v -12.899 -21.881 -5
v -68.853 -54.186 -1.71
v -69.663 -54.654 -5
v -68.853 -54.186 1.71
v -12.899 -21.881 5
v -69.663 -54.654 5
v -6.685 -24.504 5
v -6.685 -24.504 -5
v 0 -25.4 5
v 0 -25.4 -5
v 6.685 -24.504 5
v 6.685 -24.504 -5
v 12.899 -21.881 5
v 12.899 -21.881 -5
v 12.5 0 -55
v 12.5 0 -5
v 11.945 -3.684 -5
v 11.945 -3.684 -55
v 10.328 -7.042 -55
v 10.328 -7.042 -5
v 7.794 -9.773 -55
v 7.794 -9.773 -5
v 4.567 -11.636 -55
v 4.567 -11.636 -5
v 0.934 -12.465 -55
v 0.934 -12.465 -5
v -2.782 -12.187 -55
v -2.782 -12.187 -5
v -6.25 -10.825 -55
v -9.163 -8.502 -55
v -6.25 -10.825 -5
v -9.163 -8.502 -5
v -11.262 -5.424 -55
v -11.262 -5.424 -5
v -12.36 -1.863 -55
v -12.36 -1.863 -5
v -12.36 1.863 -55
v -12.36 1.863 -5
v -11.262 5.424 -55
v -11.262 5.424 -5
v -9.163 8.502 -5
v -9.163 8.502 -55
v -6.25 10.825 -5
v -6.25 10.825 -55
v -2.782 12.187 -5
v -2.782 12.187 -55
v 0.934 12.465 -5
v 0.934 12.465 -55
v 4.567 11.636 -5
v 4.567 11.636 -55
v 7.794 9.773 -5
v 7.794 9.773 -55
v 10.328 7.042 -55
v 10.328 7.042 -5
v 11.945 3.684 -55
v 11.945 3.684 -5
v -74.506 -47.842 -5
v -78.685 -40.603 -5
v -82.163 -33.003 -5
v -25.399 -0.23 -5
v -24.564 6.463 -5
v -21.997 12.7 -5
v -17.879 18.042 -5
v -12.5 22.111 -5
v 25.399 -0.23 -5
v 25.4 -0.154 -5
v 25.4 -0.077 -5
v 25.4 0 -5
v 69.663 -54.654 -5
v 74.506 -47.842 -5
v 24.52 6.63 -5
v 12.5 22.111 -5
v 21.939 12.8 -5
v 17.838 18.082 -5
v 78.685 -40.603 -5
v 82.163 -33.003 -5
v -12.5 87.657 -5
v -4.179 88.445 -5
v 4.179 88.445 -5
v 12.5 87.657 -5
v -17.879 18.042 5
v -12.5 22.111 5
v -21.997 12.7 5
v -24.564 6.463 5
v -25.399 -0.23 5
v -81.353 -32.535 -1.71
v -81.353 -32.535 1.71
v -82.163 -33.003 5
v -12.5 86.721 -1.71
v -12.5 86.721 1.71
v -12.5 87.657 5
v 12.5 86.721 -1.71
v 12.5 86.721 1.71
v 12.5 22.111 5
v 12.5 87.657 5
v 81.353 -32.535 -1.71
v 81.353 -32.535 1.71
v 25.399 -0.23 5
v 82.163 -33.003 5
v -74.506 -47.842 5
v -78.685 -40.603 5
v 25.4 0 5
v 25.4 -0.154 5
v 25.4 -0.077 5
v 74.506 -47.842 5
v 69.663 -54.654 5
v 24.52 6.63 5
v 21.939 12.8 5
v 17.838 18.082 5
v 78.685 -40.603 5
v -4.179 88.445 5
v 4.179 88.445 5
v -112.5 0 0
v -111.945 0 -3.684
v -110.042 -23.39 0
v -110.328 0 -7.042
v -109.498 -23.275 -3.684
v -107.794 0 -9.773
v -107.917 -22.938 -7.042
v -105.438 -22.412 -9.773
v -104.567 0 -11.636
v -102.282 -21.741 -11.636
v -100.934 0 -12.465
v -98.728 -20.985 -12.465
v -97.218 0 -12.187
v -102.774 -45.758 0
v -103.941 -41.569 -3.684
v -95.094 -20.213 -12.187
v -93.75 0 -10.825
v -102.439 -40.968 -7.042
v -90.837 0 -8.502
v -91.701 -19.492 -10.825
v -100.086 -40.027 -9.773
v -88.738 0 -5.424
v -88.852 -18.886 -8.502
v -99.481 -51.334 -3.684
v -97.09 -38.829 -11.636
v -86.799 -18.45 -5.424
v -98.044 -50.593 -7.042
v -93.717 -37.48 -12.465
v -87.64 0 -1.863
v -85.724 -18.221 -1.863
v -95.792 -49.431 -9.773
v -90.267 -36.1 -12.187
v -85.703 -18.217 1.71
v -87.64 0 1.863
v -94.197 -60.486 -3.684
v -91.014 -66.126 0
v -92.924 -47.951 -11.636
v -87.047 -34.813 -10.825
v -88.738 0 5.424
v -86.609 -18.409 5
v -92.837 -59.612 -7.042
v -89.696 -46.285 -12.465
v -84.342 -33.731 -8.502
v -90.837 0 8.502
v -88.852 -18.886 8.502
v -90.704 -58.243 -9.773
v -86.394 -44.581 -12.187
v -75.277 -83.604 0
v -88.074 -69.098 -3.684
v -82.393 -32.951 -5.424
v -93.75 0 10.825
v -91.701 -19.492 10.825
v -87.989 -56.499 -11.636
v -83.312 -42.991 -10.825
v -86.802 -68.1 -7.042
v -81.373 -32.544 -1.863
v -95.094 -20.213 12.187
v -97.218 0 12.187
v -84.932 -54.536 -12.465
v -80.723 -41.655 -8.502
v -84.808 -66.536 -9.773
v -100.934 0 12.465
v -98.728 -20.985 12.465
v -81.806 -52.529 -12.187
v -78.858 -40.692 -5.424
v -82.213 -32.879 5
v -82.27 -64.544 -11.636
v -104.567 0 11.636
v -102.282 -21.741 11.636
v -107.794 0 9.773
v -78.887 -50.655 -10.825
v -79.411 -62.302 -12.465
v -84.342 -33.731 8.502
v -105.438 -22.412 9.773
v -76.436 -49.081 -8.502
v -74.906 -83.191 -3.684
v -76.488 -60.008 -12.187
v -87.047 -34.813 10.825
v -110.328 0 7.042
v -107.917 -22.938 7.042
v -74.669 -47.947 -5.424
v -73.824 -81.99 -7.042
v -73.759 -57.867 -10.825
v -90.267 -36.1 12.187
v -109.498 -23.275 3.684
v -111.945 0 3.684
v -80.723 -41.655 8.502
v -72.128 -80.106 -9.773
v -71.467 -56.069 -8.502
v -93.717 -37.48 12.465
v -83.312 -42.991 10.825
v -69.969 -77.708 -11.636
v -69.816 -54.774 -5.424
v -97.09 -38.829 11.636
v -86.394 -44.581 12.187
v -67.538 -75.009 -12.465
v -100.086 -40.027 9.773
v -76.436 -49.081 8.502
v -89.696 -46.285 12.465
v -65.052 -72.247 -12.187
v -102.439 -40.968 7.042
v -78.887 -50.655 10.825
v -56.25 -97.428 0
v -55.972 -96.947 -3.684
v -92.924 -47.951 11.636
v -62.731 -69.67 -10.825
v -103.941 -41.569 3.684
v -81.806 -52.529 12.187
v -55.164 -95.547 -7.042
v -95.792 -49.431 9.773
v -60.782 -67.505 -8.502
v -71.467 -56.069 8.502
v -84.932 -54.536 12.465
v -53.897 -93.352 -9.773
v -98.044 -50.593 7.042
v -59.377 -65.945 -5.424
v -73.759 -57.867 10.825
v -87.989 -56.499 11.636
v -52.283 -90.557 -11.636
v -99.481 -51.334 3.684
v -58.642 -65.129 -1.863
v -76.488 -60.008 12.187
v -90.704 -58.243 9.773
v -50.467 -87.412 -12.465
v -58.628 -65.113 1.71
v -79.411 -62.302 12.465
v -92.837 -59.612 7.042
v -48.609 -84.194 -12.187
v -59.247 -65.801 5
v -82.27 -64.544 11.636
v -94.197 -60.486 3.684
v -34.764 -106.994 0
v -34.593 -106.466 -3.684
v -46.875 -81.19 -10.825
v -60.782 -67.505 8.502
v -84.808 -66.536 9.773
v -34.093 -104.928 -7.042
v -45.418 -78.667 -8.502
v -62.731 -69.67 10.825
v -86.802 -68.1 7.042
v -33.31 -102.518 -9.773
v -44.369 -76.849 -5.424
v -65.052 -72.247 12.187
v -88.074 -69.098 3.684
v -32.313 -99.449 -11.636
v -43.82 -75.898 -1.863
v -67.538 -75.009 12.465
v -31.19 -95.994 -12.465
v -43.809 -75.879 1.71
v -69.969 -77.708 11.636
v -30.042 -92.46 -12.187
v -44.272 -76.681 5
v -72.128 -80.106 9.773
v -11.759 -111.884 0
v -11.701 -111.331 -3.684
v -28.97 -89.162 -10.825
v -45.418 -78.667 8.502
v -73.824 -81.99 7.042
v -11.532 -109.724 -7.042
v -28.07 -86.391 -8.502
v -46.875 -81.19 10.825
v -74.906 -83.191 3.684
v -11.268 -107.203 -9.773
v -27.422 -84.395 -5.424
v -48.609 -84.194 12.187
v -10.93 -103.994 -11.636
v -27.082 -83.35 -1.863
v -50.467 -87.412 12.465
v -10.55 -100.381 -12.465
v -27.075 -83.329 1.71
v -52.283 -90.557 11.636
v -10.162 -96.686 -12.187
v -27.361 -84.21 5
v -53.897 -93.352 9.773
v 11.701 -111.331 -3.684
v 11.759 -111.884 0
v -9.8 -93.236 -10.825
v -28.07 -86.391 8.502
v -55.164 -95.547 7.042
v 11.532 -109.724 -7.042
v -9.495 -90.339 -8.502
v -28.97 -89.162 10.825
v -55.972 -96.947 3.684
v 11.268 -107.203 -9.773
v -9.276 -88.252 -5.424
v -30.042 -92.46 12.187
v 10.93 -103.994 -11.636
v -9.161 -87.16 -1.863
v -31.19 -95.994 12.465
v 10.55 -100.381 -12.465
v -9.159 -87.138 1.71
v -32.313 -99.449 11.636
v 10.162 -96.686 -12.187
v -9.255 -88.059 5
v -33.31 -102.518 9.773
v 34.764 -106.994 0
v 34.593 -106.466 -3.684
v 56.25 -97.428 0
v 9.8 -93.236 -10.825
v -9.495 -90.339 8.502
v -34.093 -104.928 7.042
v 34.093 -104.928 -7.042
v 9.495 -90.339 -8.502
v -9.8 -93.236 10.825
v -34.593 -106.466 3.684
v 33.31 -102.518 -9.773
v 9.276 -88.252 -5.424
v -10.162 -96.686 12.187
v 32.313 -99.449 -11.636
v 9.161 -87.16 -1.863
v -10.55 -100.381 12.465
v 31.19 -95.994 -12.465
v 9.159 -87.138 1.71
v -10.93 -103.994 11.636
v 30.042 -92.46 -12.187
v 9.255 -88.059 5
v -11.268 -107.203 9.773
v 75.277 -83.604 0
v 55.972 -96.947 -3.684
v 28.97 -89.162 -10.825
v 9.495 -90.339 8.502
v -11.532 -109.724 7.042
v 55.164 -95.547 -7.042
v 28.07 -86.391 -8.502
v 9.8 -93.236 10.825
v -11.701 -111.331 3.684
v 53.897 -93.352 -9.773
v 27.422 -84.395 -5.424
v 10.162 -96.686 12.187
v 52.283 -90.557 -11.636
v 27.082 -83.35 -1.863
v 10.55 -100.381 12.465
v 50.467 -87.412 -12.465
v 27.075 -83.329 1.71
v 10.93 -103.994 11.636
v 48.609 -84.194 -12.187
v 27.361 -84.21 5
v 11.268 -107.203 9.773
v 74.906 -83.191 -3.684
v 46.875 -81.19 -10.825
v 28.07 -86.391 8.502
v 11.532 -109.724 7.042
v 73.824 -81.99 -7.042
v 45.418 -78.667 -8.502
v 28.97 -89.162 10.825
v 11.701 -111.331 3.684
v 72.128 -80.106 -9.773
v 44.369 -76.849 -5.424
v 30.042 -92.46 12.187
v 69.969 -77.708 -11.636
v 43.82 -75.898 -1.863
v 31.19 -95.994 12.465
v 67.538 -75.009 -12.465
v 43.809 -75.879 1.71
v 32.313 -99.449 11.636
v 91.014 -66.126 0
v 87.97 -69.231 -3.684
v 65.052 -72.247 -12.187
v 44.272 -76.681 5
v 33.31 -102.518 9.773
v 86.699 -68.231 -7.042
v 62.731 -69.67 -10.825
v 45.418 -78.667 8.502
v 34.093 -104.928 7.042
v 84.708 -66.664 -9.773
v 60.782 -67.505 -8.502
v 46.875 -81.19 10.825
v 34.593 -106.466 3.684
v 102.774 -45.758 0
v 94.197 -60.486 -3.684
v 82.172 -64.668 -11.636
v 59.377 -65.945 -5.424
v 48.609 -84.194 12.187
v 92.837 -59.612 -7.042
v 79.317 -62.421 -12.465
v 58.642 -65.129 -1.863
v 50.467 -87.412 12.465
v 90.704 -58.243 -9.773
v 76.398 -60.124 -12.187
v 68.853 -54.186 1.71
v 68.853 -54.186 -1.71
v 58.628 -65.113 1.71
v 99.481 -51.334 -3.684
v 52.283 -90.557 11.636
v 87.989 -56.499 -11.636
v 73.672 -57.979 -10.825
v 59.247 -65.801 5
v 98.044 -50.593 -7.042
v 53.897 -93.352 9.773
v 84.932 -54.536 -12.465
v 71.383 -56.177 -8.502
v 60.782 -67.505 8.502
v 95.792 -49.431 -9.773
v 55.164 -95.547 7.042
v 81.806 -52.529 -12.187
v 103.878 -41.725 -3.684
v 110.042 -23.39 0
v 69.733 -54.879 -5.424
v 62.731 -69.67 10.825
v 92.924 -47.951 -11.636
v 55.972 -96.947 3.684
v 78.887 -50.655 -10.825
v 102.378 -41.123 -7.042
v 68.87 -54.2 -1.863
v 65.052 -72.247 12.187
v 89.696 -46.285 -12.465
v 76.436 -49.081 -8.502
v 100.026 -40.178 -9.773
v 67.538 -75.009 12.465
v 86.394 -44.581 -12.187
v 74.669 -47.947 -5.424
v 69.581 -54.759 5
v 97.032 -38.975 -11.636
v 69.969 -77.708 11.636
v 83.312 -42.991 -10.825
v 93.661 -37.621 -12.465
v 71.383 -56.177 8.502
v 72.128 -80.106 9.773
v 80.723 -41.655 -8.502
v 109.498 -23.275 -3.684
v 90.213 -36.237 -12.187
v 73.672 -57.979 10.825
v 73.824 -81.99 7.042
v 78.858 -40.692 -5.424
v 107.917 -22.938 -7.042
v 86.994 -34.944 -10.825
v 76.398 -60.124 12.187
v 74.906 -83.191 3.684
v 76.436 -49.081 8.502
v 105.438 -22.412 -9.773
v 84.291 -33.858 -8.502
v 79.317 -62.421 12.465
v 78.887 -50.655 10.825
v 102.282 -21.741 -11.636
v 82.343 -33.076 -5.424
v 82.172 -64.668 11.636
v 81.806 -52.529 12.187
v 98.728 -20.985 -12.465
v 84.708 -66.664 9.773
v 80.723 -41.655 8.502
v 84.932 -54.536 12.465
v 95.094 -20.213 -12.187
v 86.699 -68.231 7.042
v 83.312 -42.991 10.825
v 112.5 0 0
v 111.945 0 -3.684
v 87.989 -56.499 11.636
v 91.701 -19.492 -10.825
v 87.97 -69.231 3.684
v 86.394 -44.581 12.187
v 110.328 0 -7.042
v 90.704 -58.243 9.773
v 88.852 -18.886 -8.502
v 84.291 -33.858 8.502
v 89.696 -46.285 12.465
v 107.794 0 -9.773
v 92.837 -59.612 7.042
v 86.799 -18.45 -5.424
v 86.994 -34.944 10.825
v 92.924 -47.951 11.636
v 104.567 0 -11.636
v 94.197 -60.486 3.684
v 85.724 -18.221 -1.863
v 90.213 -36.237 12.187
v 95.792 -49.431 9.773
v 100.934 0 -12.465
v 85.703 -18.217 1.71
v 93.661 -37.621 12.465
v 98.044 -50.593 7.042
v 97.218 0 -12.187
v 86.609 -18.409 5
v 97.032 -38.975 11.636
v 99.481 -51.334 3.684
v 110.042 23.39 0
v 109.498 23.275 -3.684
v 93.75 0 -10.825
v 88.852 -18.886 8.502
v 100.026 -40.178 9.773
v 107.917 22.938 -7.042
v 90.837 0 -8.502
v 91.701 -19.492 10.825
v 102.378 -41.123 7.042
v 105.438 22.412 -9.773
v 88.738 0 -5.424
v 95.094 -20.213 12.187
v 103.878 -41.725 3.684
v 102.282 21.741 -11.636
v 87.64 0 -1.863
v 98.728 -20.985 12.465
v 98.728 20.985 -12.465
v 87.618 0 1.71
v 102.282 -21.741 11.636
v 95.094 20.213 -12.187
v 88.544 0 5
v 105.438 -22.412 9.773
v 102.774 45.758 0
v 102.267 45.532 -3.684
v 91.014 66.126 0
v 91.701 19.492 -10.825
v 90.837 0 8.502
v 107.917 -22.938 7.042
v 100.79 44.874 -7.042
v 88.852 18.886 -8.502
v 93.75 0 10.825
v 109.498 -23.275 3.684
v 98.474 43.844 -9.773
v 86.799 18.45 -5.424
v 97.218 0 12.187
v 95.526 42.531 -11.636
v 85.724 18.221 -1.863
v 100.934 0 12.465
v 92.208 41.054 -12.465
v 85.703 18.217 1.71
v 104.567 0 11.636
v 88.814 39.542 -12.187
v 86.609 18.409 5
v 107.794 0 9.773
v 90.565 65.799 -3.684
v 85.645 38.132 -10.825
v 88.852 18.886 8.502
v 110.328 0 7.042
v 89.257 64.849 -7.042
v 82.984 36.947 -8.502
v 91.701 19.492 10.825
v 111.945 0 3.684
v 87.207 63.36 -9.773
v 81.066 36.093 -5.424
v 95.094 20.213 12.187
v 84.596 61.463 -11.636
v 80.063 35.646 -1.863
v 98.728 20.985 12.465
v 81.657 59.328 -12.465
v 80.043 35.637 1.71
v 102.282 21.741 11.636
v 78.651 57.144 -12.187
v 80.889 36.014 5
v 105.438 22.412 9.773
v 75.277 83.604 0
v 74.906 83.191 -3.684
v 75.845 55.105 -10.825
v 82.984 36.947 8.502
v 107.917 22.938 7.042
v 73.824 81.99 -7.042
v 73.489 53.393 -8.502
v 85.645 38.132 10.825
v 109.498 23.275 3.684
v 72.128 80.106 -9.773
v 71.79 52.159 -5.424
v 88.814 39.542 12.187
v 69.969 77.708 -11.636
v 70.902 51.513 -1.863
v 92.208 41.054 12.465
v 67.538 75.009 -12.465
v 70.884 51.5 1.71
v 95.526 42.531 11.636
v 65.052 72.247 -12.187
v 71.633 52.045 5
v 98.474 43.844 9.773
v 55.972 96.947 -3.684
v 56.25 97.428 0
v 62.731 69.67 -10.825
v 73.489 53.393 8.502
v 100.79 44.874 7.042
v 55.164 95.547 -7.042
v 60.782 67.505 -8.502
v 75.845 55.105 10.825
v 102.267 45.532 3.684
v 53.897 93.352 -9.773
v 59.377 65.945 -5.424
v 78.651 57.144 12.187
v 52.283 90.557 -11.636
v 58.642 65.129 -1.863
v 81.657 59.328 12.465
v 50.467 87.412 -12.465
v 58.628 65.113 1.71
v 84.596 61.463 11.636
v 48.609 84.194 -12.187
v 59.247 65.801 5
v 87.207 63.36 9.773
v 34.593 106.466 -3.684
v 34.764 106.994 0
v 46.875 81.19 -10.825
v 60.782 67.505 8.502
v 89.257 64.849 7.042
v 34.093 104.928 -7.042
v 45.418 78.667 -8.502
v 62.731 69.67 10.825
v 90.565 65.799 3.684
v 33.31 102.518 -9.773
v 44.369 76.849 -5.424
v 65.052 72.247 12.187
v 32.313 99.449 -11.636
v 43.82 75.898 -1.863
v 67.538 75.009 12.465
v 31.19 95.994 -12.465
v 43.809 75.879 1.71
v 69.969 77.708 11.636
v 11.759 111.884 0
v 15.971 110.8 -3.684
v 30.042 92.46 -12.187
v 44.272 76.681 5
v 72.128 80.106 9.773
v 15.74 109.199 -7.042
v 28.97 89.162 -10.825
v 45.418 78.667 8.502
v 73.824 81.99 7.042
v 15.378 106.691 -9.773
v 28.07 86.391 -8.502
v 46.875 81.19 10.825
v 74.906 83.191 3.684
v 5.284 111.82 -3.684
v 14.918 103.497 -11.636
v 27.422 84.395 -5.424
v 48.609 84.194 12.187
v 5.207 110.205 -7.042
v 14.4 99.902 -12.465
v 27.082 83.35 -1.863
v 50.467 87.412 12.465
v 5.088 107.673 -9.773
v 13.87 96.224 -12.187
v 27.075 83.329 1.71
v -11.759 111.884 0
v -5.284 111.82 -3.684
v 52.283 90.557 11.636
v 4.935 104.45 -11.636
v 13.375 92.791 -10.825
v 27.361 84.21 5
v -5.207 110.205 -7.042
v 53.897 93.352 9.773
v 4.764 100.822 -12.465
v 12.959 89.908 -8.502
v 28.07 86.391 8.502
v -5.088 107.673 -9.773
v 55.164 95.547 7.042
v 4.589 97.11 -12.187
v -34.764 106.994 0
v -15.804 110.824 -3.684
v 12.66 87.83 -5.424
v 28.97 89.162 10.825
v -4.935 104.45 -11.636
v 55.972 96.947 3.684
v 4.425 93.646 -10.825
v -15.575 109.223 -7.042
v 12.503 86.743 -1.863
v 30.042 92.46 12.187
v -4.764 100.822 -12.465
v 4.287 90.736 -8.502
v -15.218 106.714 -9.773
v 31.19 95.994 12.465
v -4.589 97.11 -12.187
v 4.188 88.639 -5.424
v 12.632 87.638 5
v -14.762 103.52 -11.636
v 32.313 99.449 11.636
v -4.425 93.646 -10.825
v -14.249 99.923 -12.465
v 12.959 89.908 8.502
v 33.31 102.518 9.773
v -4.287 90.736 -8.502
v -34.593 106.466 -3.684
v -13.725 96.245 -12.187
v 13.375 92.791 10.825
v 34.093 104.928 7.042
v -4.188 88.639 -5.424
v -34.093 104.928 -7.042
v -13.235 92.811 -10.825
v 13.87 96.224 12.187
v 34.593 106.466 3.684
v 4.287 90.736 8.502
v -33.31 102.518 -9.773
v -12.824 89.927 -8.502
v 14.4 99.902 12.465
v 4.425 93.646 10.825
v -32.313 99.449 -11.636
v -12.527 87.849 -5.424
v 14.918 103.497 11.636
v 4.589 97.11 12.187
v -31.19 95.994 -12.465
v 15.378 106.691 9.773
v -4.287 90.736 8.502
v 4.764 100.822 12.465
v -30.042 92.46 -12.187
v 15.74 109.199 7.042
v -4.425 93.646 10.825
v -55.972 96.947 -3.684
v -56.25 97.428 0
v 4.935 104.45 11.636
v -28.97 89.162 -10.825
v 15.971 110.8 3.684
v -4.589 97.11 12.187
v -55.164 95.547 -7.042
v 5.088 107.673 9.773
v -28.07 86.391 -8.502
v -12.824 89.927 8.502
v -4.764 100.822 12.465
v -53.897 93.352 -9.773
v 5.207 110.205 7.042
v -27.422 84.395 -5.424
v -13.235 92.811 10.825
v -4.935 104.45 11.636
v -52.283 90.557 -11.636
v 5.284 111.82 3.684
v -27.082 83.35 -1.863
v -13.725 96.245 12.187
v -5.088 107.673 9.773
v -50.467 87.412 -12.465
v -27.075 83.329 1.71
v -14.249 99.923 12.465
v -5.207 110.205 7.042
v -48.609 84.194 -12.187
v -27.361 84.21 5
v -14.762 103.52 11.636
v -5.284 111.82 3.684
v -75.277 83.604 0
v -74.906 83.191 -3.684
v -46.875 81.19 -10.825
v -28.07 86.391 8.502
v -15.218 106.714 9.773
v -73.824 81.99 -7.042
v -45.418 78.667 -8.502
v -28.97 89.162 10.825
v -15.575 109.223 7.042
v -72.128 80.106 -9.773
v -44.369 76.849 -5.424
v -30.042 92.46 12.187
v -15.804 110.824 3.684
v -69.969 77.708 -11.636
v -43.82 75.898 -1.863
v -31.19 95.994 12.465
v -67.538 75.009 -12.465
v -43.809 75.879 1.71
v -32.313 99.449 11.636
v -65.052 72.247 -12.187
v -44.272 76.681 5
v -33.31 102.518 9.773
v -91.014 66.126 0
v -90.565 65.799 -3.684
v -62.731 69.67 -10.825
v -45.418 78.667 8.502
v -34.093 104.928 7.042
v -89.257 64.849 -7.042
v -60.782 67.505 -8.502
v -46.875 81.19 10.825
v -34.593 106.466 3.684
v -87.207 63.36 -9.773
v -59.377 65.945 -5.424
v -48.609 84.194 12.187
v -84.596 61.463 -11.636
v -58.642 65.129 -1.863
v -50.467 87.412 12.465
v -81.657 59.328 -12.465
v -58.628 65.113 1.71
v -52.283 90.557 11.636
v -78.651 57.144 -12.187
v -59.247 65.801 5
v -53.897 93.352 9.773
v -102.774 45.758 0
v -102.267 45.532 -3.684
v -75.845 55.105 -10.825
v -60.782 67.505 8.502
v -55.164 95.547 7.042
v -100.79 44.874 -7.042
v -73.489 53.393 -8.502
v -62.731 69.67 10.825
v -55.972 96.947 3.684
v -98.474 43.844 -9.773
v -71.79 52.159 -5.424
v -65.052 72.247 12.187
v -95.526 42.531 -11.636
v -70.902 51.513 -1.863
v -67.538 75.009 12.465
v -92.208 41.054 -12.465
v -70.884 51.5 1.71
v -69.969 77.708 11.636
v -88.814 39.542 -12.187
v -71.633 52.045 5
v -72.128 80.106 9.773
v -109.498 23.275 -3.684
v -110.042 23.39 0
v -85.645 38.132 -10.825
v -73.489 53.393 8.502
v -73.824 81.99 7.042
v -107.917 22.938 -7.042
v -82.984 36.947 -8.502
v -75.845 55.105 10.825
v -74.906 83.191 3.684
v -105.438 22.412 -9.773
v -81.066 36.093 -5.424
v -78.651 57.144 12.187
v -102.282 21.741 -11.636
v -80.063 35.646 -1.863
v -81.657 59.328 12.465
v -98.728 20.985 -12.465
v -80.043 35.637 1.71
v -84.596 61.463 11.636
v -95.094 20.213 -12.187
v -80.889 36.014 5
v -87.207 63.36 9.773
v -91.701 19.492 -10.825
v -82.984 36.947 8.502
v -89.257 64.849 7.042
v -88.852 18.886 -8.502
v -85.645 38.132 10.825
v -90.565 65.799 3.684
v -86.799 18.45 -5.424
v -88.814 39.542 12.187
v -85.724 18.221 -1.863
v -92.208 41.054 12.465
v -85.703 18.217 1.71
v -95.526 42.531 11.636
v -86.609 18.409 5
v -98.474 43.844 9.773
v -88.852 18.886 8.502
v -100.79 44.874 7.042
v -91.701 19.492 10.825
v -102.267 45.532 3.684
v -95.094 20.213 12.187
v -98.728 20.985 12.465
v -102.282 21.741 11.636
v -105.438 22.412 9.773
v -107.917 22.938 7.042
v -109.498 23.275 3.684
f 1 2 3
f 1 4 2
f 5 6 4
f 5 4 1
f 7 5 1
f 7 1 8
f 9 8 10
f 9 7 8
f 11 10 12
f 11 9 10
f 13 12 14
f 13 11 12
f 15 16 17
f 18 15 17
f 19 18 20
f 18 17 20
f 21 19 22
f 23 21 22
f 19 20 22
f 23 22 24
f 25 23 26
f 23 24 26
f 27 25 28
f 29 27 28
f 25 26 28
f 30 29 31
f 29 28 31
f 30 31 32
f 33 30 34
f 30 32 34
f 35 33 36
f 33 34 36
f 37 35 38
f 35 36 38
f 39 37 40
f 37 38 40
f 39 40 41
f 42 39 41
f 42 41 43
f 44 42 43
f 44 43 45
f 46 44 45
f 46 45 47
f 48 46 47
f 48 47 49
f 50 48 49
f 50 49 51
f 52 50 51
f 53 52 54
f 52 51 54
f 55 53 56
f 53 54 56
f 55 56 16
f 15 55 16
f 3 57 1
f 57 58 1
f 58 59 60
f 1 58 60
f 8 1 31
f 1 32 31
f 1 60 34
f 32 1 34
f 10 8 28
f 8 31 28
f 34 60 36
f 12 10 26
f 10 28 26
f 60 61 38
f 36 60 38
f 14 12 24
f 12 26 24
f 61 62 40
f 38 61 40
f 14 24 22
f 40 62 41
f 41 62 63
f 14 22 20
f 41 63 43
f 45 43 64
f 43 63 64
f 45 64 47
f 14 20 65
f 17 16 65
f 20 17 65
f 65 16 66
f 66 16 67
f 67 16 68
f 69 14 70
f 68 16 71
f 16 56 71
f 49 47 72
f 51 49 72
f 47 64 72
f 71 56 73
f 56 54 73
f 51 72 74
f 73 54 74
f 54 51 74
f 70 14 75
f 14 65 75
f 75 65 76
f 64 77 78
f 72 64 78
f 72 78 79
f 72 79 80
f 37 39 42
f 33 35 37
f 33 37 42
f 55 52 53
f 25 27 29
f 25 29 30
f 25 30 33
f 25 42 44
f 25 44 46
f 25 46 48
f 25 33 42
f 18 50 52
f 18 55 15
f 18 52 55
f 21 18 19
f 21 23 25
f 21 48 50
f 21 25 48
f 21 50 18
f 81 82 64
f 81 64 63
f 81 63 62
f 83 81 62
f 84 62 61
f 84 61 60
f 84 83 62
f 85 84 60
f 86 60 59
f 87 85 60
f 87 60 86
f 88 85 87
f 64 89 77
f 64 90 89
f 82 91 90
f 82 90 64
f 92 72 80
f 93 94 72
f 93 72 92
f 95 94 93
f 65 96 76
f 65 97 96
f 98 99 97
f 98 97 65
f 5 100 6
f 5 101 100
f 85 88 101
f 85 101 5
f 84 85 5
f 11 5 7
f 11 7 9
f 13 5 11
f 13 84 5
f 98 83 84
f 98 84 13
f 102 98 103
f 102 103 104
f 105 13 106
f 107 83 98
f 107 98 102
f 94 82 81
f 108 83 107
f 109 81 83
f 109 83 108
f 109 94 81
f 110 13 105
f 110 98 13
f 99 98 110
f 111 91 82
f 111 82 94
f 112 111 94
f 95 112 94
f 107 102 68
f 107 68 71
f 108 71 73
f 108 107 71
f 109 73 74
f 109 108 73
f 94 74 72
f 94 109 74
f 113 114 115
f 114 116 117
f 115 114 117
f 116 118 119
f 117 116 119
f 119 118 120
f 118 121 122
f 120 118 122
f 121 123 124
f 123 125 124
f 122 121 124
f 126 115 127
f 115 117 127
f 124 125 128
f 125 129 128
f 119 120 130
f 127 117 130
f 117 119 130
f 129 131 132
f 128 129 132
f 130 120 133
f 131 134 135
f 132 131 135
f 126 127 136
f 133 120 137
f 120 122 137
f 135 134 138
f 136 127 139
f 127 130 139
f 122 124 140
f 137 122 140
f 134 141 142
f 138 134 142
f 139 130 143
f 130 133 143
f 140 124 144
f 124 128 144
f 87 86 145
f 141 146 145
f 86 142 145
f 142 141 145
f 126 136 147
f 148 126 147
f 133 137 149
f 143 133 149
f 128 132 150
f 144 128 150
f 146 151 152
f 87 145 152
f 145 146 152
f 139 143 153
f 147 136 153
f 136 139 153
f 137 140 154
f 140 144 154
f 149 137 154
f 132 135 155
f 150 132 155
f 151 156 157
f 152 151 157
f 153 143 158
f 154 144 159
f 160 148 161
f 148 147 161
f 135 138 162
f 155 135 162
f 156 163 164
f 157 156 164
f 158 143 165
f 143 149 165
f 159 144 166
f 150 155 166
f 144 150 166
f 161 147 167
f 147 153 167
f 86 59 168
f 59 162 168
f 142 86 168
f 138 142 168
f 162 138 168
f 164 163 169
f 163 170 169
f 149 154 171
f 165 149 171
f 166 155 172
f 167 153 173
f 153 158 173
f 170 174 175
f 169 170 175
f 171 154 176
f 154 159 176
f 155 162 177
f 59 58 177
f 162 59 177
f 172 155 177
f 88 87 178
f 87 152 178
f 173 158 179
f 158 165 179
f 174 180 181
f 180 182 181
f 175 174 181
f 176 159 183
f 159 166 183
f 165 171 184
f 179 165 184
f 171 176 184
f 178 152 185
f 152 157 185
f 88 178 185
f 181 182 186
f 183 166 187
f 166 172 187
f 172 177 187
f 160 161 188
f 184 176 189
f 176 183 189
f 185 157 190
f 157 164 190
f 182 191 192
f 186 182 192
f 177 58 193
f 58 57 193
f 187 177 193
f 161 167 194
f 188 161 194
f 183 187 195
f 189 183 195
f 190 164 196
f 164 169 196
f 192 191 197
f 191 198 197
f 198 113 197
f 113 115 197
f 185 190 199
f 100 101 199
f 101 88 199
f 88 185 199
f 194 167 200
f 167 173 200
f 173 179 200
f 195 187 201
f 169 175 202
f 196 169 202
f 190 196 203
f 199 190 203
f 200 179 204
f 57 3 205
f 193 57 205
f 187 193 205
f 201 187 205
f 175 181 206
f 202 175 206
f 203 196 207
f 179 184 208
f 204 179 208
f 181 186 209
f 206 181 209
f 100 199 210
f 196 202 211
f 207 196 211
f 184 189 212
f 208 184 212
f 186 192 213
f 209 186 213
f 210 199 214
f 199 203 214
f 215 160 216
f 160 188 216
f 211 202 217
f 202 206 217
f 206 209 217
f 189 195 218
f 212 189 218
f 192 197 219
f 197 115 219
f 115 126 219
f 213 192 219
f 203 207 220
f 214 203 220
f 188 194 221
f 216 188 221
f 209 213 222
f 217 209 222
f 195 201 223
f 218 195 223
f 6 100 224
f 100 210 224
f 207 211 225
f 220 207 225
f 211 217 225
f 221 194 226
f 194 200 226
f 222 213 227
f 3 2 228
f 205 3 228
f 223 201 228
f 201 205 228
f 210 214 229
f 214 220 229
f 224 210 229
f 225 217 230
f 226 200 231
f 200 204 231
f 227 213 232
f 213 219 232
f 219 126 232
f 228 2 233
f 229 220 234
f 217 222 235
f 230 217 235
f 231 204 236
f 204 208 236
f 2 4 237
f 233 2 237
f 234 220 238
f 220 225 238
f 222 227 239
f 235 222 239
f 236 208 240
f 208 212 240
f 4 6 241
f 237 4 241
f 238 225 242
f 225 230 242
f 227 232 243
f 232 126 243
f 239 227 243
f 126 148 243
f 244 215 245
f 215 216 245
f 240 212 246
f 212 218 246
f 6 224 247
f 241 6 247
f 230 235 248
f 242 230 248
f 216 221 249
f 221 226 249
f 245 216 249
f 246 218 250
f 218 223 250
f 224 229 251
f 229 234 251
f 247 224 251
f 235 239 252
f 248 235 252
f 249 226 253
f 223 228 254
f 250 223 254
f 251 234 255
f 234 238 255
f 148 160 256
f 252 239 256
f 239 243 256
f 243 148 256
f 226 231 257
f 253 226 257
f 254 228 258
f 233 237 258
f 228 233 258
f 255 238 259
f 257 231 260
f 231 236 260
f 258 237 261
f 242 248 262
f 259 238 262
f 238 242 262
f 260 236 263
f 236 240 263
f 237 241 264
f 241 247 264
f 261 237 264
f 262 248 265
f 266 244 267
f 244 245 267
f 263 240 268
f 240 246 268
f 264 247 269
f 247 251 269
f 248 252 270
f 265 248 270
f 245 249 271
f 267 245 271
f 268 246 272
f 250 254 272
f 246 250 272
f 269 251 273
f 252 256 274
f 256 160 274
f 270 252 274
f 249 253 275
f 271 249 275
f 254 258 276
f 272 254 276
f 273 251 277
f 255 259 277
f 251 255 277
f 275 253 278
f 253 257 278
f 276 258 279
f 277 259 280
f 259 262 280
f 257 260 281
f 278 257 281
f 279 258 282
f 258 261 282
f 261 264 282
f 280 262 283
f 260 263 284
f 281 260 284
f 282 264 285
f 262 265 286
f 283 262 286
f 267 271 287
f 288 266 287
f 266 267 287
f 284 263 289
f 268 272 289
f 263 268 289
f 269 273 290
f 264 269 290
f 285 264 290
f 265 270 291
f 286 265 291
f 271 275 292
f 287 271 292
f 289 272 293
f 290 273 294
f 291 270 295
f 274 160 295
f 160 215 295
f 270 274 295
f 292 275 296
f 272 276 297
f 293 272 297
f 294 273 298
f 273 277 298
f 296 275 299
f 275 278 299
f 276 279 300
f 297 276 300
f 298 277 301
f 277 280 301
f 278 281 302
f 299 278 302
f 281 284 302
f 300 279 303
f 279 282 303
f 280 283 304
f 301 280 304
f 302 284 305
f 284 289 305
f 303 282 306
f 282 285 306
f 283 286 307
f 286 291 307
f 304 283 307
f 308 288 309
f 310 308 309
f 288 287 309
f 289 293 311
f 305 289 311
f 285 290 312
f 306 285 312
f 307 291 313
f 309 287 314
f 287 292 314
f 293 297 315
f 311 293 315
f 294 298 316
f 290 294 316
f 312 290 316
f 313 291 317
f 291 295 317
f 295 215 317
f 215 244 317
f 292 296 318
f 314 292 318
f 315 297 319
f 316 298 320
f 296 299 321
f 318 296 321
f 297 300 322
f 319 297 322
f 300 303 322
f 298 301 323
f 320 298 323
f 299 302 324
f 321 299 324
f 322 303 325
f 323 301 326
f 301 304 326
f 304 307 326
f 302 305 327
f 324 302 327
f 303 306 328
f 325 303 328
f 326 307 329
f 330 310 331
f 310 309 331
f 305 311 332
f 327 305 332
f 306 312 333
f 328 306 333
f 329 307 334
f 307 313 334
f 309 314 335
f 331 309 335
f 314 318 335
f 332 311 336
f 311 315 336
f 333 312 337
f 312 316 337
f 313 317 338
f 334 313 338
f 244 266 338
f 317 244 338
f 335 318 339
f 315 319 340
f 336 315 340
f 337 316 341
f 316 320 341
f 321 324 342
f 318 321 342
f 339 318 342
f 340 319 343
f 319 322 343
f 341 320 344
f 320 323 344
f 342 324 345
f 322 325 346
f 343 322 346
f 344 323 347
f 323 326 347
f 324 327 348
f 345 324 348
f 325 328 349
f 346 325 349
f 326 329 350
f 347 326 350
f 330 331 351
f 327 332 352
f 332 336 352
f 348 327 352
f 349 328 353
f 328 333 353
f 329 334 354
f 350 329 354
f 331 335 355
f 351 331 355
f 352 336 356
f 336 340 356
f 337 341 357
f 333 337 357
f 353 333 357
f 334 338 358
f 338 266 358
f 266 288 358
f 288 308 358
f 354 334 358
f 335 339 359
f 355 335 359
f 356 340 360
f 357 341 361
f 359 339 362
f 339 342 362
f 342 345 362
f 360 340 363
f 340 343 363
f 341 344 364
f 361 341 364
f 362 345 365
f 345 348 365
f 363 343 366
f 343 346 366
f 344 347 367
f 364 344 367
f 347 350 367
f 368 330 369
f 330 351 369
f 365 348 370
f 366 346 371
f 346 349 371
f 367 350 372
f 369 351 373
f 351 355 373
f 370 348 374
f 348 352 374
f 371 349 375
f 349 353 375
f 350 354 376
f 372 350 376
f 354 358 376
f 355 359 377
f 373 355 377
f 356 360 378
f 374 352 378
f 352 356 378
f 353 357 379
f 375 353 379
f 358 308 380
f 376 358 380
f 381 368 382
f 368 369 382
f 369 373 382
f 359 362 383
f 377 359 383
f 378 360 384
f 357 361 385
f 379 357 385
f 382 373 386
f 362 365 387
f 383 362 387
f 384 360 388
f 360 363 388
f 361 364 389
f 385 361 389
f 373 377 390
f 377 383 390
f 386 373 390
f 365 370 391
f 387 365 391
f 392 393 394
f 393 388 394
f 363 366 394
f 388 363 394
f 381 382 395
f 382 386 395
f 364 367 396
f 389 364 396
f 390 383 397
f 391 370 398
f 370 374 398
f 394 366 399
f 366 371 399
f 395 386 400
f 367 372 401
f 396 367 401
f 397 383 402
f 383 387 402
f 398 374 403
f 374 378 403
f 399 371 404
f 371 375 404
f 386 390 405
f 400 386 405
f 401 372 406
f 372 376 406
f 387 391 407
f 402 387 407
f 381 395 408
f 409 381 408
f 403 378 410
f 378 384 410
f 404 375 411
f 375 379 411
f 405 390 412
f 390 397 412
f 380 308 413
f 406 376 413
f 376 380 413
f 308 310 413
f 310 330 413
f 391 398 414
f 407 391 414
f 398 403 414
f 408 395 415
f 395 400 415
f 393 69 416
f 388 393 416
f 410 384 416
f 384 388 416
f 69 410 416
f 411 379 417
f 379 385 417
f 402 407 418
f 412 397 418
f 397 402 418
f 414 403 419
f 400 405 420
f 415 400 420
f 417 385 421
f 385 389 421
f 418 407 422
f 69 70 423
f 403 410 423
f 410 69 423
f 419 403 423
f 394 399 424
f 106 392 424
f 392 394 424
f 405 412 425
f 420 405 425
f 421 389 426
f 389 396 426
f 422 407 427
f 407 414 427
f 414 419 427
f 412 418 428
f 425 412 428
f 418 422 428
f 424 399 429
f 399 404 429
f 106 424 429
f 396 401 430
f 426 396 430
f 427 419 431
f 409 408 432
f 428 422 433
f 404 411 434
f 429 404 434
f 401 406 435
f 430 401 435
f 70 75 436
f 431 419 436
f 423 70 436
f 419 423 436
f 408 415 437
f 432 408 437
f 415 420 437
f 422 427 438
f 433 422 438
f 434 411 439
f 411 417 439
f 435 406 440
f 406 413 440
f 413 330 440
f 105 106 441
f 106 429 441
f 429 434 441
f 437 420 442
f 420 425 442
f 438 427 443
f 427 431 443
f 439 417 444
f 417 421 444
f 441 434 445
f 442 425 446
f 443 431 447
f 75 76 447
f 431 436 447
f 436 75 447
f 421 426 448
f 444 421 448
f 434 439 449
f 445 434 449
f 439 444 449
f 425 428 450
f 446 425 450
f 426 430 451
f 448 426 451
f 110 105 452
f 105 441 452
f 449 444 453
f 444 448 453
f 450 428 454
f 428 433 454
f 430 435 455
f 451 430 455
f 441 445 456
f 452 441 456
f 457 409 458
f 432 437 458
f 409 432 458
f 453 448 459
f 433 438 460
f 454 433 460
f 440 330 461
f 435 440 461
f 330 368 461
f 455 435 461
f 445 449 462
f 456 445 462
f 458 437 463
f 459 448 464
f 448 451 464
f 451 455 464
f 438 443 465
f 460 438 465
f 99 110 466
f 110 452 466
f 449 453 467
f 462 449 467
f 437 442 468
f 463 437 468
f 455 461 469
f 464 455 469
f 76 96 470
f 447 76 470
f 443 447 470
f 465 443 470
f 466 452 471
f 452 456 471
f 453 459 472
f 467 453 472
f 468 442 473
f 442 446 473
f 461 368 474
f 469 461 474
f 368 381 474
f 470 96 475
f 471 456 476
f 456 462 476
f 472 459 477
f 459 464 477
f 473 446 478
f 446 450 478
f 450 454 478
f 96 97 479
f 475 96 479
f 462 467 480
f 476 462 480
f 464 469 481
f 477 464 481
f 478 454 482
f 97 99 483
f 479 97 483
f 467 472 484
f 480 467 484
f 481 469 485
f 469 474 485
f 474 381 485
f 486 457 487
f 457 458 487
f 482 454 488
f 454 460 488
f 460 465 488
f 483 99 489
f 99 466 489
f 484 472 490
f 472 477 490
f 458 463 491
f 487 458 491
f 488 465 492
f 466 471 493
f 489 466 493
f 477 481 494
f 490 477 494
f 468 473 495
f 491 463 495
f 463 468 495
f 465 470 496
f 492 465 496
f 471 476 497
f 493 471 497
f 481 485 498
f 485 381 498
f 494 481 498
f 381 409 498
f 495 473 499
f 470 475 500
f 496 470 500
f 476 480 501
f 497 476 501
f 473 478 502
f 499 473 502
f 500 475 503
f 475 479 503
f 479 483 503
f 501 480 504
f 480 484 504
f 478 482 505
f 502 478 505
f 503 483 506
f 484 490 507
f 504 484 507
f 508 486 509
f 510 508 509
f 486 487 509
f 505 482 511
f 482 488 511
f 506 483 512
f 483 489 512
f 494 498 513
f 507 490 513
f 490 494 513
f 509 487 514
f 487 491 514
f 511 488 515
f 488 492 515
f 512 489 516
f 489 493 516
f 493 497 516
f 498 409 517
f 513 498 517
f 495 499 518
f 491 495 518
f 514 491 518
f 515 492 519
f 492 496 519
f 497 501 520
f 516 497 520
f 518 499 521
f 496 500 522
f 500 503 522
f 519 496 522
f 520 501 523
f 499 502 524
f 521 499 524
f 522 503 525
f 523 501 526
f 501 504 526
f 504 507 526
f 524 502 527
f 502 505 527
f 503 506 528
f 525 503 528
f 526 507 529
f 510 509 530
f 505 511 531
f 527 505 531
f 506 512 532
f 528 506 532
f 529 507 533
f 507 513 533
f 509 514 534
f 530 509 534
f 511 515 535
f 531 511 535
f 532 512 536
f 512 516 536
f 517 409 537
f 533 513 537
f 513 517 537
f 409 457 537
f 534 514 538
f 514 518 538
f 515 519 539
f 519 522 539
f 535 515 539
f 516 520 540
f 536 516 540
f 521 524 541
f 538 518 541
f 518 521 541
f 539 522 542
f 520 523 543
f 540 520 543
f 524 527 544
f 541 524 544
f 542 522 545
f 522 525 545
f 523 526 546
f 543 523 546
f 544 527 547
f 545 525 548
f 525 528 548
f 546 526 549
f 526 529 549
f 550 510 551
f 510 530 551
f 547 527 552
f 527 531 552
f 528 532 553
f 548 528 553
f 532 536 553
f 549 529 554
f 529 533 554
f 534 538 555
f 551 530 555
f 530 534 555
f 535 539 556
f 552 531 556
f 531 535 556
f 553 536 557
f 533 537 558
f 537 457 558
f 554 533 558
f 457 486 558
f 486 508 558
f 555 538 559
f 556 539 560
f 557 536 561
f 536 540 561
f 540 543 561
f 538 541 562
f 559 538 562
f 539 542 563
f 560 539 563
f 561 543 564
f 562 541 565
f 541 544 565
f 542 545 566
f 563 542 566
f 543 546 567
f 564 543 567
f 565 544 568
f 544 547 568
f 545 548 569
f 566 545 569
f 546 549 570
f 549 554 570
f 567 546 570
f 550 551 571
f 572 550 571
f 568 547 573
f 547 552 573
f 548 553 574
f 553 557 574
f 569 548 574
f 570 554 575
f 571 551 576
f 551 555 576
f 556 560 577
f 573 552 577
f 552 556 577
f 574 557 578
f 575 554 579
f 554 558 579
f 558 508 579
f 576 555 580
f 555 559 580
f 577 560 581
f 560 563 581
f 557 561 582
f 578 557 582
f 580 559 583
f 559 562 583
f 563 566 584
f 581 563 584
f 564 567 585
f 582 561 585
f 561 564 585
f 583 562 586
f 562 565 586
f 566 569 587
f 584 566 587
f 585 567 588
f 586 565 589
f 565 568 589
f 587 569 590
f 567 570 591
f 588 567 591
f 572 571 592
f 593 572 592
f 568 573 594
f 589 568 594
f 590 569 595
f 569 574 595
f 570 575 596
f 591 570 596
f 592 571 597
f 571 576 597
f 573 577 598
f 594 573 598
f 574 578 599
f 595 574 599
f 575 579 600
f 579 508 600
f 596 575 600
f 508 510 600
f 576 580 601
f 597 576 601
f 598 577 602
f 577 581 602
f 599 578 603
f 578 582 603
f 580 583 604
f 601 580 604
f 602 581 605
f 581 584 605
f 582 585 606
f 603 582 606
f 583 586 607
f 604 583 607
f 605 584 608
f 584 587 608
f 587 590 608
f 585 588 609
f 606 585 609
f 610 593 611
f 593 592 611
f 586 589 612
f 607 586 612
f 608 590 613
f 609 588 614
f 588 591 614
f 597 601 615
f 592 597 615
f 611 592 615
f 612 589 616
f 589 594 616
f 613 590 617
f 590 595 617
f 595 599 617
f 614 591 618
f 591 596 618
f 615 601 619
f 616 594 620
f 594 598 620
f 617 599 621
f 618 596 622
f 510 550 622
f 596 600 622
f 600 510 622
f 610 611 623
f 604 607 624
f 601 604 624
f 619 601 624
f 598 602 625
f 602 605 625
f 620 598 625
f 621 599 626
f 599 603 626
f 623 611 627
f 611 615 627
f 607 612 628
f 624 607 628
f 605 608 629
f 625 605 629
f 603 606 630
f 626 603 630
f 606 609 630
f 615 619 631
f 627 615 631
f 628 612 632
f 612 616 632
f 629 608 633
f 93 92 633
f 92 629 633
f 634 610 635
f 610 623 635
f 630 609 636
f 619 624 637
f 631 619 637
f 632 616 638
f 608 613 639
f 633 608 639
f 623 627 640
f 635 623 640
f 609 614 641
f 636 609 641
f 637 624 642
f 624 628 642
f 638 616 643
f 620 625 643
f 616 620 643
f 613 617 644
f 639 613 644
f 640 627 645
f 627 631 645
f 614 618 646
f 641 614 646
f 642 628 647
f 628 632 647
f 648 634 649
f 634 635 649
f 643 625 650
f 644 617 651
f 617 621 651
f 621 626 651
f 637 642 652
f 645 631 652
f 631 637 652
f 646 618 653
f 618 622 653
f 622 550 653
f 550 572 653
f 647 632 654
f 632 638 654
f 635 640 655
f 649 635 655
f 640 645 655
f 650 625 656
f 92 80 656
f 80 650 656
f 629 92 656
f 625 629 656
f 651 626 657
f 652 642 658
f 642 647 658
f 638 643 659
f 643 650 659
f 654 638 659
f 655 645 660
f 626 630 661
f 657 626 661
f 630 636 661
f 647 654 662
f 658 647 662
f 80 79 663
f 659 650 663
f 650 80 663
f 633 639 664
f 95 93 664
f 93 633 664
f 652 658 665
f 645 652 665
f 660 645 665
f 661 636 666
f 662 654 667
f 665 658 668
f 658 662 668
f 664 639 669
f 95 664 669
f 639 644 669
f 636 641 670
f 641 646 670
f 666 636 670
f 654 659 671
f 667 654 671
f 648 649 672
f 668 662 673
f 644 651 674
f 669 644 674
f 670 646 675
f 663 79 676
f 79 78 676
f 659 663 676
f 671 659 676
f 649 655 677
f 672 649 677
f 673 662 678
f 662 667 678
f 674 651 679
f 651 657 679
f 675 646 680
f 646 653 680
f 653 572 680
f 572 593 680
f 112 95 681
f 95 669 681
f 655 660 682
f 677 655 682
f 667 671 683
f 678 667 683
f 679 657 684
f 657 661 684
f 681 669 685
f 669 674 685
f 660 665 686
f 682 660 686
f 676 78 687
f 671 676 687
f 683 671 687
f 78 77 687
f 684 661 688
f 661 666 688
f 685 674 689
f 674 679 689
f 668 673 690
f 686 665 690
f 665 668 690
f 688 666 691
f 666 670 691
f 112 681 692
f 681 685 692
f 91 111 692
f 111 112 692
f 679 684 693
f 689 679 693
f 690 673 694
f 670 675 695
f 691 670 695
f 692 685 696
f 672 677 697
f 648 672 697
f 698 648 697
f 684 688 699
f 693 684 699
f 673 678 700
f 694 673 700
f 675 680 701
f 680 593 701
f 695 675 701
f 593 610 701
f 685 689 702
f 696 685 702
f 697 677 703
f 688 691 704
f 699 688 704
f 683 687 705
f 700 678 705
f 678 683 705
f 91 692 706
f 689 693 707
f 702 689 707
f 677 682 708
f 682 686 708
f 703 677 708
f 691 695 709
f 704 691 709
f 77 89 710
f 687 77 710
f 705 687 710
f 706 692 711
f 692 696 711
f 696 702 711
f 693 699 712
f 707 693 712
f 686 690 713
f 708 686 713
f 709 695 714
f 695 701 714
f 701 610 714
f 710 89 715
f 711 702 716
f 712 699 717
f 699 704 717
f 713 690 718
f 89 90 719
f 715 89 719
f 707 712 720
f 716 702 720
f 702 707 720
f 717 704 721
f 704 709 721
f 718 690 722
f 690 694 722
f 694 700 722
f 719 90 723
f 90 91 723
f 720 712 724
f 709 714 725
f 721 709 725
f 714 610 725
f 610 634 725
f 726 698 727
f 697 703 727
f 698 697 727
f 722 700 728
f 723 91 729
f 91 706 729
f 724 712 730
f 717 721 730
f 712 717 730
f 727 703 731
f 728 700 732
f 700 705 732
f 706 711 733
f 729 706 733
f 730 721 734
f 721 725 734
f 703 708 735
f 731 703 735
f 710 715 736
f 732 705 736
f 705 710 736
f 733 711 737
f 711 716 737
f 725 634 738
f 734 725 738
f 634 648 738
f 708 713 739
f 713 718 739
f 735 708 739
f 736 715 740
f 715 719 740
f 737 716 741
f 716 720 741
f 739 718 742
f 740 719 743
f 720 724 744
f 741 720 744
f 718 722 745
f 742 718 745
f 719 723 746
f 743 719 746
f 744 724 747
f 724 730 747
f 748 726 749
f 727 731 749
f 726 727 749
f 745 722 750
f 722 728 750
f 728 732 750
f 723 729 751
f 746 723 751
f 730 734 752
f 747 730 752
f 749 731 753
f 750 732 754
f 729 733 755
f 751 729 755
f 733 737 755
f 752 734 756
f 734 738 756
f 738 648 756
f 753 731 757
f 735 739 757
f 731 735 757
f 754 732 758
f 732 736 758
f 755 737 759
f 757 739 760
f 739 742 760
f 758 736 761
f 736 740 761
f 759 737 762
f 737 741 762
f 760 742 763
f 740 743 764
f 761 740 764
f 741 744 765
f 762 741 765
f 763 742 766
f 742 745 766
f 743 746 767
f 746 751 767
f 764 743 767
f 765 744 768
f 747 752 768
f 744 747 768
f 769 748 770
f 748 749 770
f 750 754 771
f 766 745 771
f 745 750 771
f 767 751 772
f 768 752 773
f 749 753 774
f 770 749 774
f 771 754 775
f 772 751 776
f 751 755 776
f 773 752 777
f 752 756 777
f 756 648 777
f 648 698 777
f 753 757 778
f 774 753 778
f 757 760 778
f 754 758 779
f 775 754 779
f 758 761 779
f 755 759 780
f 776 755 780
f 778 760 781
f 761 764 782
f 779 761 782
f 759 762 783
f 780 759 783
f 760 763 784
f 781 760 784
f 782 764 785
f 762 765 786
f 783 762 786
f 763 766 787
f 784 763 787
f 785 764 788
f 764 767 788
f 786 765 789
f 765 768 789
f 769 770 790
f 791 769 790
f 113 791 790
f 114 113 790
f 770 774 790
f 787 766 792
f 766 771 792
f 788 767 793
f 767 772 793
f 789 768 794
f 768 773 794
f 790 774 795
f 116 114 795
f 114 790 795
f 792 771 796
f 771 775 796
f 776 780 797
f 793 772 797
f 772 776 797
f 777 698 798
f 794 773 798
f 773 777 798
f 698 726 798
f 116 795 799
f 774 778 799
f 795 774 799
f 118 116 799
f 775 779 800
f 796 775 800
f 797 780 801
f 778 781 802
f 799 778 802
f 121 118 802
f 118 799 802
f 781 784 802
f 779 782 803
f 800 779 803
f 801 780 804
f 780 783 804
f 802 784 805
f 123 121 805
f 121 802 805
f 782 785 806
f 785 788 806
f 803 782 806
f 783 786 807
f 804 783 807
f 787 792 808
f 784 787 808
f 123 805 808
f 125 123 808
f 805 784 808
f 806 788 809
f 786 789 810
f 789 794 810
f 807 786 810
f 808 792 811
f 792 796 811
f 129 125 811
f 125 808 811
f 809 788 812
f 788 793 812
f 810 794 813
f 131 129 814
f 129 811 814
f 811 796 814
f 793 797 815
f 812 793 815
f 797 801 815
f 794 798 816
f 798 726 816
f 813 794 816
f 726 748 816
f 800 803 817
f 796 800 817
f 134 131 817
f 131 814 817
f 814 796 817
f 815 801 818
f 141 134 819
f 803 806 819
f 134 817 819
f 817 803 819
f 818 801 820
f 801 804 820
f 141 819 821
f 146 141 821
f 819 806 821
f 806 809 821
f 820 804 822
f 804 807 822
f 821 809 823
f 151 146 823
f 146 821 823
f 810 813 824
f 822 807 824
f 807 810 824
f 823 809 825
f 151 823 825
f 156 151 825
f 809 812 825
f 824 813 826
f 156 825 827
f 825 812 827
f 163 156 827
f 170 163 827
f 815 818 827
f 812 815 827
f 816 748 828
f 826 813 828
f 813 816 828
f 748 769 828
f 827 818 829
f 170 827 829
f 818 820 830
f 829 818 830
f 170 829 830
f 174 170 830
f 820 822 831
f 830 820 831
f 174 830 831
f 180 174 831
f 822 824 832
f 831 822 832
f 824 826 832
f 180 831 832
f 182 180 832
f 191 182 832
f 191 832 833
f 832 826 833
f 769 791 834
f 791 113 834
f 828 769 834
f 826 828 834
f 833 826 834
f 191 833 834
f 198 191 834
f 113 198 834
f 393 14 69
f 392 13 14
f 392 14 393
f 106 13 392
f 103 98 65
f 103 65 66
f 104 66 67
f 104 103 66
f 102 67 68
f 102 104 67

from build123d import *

# Parameters (mm, degrees)
SKETCH2_R           = 12.5
BOSS_EXTRUDE1_DEPTH = 5
SKETCH4_R           = 12.5
BOSS_EXTRUDE2_DEPTH = 50


with BuildPart() as part:
    # Sketch2 → Revolve1 (revolve)
    with BuildSketch(Plane(origin=(0, 0, 0), x_dir=(1, 0, 0), z_dir=(0, 1, 0)), mode=Mode.PRIVATE) as revolve1_sk:
        with Locations((100, 0)):
            Circle(SKETCH2_R)
    revolve(revolve1_sk.sketch.rotate(Axis((0, 0, 0), (0, 0, 1)), 180), axis=Axis((0, 0, 0), (0, 0, 1)))

    # Sketch3 → Boss-Extrude1 (add, symmetric)
    with BuildSketch(Plane.XY):
        with BuildLine():
            Line((-73.52073385, -56.880972209), (-12.898955585, -21.880972209))
            ThreePointArc((-12.898955585, -21.880972209), (-21.997045256, -12.7), (-25.398955585, -0.230337114))
            Line((-25.398955585, -0.230337114), (-86.02073385, -35.230337114))
            Line((-86.02073385, -35.230337114), (-73.52073385, -56.880972209))
        make_face()
        with BuildLine():
            Line((-25.398955585, -0.230337114), (-12.898955585, -21.880972209))
            ThreePointArc((-12.898955585, -21.880972209), (0, -25.4), (12.898955585, -21.880972209))
            Line((12.898955585, -21.880972209), (25.398955585, -0.230337114))
            ThreePointArc((25.398955585, -0.230337114), (25.399738895, -0.115169741), (25.4, 0))
            ThreePointArc((25.4, 0), (21.939234262, 12.799609369), (12.5, 22.111309324))
            Line((12.5, 22.111309324), (-12.5, 22.111309324))
            ThreePointArc((-12.5, 22.111309324), (-21.997045256, 12.7), (-25.398955585, -0.230337114))
        make_face()
        with BuildLine():
            ThreePointArc((-25.398955585, -0.230337114), (-21.997045256, -12.7), (-12.898955585, -21.880972209))
            Line((-12.898955585, -21.880972209), (-25.398955585, -0.230337114))
        make_face()
        with BuildLine():
            ThreePointArc((12.5, 22.111309324), (0, 25.4), (-12.5, 22.111309324))
            Line((-12.5, 22.111309324), (12.5, 22.111309324))
        make_face()
        with BuildLine():
            Line((-12.5, 92.111309324), (-12.5, 22.111309324))
            ThreePointArc((-12.5, 22.111309324), (0, 25.4), (12.5, 22.111309324))
            Line((12.5, 22.111309324), (12.5, 92.111309324))
            Line((12.5, 92.111309324), (-12.5, 92.111309324))
        make_face()
        with BuildLine():
            Line((25.398955585, -0.230337114), (12.898955585, -21.880972209))
            ThreePointArc((12.898955585, -21.880972209), (21.997045256, -12.7), (25.398955585, -0.230337114))
        make_face()
        with BuildLine():
            ThreePointArc((25.398955585, -0.230337114), (21.997045256, -12.7), (12.898955585, -21.880972209))
            Line((12.898955585, -21.880972209), (73.52073385, -56.880972209))
            Line((73.52073385, -56.880972209), (86.02073385, -35.230337114))
            Line((86.02073385, -35.230337114), (25.398955585, -0.230337114))
        make_face()
    extrude(amount=BOSS_EXTRUDE1_DEPTH, both=True)

    # Sketch4 → Boss-Extrude2 (add)
    with BuildSketch(Plane(origin=(0, 0, -5), x_dir=(-1, 0, 0), z_dir=(0, 0, -1))):
        with Locations(Location((0, 0, 0), (0, 0, 180))):
            Circle(SKETCH4_R)
    extrude(amount=BOSS_EXTRUDE2_DEPTH)


solid = part.part
